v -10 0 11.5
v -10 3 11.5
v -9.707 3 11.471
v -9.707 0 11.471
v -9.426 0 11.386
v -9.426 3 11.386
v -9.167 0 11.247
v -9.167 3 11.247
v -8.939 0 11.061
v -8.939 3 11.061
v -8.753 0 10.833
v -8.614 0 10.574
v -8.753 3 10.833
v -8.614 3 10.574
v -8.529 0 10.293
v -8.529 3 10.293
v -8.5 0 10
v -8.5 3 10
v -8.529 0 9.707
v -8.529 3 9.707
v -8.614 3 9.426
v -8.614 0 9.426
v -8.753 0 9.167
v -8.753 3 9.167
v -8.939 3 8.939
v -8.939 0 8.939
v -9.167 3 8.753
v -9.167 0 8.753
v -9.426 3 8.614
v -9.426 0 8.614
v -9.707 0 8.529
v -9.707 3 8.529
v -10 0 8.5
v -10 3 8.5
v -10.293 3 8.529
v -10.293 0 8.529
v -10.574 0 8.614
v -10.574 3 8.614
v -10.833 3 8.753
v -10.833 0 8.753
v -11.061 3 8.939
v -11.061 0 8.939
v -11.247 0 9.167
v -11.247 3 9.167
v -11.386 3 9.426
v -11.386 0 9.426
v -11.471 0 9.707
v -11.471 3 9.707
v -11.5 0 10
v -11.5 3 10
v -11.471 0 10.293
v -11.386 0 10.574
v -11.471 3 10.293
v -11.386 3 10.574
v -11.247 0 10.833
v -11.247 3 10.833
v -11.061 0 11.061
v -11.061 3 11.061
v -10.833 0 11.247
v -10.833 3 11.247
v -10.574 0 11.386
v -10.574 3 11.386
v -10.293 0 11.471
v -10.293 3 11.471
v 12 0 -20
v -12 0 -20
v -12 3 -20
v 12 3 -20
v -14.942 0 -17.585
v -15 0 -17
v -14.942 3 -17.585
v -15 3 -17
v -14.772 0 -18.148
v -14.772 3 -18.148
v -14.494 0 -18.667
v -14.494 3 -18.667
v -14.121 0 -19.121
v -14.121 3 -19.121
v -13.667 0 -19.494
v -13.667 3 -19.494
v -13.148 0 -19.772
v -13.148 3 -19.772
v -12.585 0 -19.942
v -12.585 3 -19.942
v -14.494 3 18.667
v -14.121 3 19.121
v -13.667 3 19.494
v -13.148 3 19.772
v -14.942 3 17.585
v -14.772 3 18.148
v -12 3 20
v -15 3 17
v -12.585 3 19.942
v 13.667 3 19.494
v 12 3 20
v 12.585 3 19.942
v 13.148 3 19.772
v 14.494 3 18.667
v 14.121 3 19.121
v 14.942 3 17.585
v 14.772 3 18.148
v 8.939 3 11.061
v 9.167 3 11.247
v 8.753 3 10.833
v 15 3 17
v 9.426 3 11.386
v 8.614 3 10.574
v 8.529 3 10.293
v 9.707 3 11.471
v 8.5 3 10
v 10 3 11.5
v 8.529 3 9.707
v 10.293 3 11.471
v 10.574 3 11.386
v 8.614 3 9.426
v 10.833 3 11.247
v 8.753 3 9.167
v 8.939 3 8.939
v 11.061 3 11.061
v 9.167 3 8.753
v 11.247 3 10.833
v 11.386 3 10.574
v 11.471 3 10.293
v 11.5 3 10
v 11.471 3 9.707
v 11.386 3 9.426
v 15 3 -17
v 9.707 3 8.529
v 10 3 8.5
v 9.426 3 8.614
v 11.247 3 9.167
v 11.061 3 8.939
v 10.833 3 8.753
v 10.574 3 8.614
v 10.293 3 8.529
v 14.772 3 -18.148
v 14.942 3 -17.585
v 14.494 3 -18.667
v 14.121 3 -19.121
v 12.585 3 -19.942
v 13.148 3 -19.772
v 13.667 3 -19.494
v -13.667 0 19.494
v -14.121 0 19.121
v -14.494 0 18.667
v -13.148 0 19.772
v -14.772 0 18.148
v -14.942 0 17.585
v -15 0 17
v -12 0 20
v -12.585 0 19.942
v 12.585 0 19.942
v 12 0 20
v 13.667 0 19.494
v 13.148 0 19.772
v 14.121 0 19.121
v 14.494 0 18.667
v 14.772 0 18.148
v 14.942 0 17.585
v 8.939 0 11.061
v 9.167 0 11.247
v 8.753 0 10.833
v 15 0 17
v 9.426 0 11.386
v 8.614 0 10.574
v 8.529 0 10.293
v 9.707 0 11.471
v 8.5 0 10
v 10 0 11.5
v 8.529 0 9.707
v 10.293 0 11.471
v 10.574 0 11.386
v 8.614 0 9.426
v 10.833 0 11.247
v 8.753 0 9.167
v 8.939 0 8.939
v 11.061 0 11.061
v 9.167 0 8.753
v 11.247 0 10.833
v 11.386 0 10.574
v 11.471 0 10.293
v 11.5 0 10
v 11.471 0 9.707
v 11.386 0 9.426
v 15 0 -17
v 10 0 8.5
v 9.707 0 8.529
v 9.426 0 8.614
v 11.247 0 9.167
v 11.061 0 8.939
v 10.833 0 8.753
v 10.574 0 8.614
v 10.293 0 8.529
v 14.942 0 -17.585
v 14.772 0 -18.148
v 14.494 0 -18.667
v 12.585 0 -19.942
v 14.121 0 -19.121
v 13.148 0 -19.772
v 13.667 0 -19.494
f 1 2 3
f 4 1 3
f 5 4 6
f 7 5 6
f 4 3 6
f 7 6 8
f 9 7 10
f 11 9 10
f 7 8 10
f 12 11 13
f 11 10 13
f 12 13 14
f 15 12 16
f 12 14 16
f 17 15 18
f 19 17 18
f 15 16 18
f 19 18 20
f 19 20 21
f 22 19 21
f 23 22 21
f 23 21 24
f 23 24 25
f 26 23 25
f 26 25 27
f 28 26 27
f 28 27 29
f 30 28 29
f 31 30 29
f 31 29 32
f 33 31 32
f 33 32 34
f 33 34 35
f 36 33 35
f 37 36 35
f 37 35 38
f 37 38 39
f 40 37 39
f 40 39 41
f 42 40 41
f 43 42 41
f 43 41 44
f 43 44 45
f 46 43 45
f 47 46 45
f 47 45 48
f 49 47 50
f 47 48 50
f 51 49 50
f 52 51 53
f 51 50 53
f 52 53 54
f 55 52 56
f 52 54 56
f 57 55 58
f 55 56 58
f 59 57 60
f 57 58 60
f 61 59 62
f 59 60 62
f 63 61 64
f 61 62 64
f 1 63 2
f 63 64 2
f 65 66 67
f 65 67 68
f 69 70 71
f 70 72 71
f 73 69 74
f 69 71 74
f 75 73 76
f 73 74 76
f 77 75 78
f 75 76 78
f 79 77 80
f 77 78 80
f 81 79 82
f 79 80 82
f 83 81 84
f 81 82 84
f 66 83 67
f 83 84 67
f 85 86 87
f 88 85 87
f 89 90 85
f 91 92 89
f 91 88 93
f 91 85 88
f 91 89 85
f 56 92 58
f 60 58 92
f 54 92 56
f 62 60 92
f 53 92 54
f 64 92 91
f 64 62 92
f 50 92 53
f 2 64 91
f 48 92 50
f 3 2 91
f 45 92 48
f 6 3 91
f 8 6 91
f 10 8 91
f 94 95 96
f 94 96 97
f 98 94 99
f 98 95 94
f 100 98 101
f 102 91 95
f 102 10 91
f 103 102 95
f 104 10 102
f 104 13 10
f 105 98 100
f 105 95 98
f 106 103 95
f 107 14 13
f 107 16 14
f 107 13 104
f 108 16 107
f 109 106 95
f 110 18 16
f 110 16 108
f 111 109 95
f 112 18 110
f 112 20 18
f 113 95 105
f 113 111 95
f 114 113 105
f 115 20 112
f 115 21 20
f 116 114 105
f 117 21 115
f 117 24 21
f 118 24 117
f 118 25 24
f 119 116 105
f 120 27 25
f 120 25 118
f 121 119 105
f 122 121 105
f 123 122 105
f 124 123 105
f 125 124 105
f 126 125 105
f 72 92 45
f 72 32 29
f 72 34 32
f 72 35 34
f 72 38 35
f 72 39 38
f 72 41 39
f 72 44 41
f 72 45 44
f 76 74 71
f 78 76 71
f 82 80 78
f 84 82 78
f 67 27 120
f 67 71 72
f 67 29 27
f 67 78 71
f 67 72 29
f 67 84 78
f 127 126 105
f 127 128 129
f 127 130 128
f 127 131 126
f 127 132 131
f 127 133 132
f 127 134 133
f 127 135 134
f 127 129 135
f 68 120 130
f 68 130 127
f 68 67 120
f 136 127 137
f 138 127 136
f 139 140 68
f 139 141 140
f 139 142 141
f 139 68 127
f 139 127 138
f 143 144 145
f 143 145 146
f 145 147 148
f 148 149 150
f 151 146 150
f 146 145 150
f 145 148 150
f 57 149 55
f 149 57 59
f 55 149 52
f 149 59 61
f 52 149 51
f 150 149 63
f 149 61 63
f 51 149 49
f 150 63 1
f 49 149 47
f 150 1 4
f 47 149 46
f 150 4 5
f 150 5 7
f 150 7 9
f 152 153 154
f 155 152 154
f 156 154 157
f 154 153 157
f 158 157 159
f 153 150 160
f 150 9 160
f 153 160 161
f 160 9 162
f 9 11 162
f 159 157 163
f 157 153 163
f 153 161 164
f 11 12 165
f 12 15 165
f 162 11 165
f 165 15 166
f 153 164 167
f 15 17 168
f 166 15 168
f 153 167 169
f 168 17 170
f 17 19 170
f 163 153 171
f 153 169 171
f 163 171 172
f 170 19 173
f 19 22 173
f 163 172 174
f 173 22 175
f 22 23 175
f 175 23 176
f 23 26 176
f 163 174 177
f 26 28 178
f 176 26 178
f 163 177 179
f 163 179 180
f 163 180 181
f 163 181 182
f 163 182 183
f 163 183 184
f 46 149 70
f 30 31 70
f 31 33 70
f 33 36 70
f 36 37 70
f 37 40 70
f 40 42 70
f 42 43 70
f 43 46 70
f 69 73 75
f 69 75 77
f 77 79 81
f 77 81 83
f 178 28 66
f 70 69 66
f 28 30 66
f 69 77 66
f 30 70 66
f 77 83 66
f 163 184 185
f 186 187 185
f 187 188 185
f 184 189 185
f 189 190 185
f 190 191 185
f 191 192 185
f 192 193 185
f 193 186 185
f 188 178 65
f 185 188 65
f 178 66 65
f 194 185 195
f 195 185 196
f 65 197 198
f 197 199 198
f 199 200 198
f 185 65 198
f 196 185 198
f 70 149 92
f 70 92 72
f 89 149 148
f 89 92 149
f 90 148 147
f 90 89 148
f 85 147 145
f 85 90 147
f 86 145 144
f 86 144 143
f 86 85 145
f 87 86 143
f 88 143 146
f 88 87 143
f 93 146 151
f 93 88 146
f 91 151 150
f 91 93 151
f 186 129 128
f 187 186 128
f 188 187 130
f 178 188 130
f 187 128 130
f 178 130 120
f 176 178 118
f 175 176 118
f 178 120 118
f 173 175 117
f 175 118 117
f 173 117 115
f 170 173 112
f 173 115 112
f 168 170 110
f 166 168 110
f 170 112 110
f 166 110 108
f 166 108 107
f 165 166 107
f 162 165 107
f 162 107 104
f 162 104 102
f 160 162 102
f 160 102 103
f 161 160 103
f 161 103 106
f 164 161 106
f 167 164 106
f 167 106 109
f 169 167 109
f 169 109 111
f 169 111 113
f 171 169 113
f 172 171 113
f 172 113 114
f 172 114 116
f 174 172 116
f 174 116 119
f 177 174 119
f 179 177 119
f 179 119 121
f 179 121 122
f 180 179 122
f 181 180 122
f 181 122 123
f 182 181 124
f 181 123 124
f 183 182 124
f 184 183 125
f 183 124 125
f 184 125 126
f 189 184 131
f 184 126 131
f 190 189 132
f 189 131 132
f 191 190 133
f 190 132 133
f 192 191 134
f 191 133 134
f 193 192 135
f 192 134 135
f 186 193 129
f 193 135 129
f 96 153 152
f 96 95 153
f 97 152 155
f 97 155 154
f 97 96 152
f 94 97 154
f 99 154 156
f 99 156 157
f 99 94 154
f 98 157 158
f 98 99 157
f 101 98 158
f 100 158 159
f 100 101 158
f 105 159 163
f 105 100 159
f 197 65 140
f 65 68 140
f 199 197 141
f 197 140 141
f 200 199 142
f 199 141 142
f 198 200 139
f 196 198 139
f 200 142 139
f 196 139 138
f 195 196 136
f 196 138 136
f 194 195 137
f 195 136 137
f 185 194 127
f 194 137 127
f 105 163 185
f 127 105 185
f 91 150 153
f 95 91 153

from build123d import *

# Parameters (mm, degrees)
SKETCH_1_W          = 30
SKETCH_1_H          = 40
EXTRUDE_1_DEPTH     = 3
SKETCH_2_R          = 1.5
CUT_EXTRUDE_1_DEPTH = 26.179356624
FILLET_1_R          = 3


with BuildPart() as part:
    # 草图1 → 凸台-拉伸1 (new body)
    with BuildSketch(Plane(origin=(0, 0, 0), x_dir=(1, 0, 0), z_dir=(0, 1, 0))):
        Rectangle(SKETCH_1_W, SKETCH_1_H)
    extrude(amount=EXTRUDE_1_DEPTH)

    # 草图2 → 切除-拉伸1 (cut, through all)
    with BuildSketch(Plane(origin=(0, 3, 0), x_dir=(1, 0, 0), z_dir=(0, 1, 0))):
        with Locations(Location((-10, -10, 0), (0, 0, 270))):
            Circle(SKETCH_2_R)
        with Locations(Location((10, -10, 0), (0, 0, 90))):
            Circle(SKETCH_2_R)
    extrude(amount=-CUT_EXTRUDE_1_DEPTH, mode=Mode.SUBTRACT)

    # 圆角1
    fillet_1_edges = [part.edges().sort_by_distance(p)[0] for p in [
        (15, 1.5, 20),
        (-15, 1.5, 20),
        (-15, 1.5, -20),
        (15, 1.5, -20),
    ]]
    fillet(fillet_1_edges, radius=FILLET_1_R)


solid = part.part
